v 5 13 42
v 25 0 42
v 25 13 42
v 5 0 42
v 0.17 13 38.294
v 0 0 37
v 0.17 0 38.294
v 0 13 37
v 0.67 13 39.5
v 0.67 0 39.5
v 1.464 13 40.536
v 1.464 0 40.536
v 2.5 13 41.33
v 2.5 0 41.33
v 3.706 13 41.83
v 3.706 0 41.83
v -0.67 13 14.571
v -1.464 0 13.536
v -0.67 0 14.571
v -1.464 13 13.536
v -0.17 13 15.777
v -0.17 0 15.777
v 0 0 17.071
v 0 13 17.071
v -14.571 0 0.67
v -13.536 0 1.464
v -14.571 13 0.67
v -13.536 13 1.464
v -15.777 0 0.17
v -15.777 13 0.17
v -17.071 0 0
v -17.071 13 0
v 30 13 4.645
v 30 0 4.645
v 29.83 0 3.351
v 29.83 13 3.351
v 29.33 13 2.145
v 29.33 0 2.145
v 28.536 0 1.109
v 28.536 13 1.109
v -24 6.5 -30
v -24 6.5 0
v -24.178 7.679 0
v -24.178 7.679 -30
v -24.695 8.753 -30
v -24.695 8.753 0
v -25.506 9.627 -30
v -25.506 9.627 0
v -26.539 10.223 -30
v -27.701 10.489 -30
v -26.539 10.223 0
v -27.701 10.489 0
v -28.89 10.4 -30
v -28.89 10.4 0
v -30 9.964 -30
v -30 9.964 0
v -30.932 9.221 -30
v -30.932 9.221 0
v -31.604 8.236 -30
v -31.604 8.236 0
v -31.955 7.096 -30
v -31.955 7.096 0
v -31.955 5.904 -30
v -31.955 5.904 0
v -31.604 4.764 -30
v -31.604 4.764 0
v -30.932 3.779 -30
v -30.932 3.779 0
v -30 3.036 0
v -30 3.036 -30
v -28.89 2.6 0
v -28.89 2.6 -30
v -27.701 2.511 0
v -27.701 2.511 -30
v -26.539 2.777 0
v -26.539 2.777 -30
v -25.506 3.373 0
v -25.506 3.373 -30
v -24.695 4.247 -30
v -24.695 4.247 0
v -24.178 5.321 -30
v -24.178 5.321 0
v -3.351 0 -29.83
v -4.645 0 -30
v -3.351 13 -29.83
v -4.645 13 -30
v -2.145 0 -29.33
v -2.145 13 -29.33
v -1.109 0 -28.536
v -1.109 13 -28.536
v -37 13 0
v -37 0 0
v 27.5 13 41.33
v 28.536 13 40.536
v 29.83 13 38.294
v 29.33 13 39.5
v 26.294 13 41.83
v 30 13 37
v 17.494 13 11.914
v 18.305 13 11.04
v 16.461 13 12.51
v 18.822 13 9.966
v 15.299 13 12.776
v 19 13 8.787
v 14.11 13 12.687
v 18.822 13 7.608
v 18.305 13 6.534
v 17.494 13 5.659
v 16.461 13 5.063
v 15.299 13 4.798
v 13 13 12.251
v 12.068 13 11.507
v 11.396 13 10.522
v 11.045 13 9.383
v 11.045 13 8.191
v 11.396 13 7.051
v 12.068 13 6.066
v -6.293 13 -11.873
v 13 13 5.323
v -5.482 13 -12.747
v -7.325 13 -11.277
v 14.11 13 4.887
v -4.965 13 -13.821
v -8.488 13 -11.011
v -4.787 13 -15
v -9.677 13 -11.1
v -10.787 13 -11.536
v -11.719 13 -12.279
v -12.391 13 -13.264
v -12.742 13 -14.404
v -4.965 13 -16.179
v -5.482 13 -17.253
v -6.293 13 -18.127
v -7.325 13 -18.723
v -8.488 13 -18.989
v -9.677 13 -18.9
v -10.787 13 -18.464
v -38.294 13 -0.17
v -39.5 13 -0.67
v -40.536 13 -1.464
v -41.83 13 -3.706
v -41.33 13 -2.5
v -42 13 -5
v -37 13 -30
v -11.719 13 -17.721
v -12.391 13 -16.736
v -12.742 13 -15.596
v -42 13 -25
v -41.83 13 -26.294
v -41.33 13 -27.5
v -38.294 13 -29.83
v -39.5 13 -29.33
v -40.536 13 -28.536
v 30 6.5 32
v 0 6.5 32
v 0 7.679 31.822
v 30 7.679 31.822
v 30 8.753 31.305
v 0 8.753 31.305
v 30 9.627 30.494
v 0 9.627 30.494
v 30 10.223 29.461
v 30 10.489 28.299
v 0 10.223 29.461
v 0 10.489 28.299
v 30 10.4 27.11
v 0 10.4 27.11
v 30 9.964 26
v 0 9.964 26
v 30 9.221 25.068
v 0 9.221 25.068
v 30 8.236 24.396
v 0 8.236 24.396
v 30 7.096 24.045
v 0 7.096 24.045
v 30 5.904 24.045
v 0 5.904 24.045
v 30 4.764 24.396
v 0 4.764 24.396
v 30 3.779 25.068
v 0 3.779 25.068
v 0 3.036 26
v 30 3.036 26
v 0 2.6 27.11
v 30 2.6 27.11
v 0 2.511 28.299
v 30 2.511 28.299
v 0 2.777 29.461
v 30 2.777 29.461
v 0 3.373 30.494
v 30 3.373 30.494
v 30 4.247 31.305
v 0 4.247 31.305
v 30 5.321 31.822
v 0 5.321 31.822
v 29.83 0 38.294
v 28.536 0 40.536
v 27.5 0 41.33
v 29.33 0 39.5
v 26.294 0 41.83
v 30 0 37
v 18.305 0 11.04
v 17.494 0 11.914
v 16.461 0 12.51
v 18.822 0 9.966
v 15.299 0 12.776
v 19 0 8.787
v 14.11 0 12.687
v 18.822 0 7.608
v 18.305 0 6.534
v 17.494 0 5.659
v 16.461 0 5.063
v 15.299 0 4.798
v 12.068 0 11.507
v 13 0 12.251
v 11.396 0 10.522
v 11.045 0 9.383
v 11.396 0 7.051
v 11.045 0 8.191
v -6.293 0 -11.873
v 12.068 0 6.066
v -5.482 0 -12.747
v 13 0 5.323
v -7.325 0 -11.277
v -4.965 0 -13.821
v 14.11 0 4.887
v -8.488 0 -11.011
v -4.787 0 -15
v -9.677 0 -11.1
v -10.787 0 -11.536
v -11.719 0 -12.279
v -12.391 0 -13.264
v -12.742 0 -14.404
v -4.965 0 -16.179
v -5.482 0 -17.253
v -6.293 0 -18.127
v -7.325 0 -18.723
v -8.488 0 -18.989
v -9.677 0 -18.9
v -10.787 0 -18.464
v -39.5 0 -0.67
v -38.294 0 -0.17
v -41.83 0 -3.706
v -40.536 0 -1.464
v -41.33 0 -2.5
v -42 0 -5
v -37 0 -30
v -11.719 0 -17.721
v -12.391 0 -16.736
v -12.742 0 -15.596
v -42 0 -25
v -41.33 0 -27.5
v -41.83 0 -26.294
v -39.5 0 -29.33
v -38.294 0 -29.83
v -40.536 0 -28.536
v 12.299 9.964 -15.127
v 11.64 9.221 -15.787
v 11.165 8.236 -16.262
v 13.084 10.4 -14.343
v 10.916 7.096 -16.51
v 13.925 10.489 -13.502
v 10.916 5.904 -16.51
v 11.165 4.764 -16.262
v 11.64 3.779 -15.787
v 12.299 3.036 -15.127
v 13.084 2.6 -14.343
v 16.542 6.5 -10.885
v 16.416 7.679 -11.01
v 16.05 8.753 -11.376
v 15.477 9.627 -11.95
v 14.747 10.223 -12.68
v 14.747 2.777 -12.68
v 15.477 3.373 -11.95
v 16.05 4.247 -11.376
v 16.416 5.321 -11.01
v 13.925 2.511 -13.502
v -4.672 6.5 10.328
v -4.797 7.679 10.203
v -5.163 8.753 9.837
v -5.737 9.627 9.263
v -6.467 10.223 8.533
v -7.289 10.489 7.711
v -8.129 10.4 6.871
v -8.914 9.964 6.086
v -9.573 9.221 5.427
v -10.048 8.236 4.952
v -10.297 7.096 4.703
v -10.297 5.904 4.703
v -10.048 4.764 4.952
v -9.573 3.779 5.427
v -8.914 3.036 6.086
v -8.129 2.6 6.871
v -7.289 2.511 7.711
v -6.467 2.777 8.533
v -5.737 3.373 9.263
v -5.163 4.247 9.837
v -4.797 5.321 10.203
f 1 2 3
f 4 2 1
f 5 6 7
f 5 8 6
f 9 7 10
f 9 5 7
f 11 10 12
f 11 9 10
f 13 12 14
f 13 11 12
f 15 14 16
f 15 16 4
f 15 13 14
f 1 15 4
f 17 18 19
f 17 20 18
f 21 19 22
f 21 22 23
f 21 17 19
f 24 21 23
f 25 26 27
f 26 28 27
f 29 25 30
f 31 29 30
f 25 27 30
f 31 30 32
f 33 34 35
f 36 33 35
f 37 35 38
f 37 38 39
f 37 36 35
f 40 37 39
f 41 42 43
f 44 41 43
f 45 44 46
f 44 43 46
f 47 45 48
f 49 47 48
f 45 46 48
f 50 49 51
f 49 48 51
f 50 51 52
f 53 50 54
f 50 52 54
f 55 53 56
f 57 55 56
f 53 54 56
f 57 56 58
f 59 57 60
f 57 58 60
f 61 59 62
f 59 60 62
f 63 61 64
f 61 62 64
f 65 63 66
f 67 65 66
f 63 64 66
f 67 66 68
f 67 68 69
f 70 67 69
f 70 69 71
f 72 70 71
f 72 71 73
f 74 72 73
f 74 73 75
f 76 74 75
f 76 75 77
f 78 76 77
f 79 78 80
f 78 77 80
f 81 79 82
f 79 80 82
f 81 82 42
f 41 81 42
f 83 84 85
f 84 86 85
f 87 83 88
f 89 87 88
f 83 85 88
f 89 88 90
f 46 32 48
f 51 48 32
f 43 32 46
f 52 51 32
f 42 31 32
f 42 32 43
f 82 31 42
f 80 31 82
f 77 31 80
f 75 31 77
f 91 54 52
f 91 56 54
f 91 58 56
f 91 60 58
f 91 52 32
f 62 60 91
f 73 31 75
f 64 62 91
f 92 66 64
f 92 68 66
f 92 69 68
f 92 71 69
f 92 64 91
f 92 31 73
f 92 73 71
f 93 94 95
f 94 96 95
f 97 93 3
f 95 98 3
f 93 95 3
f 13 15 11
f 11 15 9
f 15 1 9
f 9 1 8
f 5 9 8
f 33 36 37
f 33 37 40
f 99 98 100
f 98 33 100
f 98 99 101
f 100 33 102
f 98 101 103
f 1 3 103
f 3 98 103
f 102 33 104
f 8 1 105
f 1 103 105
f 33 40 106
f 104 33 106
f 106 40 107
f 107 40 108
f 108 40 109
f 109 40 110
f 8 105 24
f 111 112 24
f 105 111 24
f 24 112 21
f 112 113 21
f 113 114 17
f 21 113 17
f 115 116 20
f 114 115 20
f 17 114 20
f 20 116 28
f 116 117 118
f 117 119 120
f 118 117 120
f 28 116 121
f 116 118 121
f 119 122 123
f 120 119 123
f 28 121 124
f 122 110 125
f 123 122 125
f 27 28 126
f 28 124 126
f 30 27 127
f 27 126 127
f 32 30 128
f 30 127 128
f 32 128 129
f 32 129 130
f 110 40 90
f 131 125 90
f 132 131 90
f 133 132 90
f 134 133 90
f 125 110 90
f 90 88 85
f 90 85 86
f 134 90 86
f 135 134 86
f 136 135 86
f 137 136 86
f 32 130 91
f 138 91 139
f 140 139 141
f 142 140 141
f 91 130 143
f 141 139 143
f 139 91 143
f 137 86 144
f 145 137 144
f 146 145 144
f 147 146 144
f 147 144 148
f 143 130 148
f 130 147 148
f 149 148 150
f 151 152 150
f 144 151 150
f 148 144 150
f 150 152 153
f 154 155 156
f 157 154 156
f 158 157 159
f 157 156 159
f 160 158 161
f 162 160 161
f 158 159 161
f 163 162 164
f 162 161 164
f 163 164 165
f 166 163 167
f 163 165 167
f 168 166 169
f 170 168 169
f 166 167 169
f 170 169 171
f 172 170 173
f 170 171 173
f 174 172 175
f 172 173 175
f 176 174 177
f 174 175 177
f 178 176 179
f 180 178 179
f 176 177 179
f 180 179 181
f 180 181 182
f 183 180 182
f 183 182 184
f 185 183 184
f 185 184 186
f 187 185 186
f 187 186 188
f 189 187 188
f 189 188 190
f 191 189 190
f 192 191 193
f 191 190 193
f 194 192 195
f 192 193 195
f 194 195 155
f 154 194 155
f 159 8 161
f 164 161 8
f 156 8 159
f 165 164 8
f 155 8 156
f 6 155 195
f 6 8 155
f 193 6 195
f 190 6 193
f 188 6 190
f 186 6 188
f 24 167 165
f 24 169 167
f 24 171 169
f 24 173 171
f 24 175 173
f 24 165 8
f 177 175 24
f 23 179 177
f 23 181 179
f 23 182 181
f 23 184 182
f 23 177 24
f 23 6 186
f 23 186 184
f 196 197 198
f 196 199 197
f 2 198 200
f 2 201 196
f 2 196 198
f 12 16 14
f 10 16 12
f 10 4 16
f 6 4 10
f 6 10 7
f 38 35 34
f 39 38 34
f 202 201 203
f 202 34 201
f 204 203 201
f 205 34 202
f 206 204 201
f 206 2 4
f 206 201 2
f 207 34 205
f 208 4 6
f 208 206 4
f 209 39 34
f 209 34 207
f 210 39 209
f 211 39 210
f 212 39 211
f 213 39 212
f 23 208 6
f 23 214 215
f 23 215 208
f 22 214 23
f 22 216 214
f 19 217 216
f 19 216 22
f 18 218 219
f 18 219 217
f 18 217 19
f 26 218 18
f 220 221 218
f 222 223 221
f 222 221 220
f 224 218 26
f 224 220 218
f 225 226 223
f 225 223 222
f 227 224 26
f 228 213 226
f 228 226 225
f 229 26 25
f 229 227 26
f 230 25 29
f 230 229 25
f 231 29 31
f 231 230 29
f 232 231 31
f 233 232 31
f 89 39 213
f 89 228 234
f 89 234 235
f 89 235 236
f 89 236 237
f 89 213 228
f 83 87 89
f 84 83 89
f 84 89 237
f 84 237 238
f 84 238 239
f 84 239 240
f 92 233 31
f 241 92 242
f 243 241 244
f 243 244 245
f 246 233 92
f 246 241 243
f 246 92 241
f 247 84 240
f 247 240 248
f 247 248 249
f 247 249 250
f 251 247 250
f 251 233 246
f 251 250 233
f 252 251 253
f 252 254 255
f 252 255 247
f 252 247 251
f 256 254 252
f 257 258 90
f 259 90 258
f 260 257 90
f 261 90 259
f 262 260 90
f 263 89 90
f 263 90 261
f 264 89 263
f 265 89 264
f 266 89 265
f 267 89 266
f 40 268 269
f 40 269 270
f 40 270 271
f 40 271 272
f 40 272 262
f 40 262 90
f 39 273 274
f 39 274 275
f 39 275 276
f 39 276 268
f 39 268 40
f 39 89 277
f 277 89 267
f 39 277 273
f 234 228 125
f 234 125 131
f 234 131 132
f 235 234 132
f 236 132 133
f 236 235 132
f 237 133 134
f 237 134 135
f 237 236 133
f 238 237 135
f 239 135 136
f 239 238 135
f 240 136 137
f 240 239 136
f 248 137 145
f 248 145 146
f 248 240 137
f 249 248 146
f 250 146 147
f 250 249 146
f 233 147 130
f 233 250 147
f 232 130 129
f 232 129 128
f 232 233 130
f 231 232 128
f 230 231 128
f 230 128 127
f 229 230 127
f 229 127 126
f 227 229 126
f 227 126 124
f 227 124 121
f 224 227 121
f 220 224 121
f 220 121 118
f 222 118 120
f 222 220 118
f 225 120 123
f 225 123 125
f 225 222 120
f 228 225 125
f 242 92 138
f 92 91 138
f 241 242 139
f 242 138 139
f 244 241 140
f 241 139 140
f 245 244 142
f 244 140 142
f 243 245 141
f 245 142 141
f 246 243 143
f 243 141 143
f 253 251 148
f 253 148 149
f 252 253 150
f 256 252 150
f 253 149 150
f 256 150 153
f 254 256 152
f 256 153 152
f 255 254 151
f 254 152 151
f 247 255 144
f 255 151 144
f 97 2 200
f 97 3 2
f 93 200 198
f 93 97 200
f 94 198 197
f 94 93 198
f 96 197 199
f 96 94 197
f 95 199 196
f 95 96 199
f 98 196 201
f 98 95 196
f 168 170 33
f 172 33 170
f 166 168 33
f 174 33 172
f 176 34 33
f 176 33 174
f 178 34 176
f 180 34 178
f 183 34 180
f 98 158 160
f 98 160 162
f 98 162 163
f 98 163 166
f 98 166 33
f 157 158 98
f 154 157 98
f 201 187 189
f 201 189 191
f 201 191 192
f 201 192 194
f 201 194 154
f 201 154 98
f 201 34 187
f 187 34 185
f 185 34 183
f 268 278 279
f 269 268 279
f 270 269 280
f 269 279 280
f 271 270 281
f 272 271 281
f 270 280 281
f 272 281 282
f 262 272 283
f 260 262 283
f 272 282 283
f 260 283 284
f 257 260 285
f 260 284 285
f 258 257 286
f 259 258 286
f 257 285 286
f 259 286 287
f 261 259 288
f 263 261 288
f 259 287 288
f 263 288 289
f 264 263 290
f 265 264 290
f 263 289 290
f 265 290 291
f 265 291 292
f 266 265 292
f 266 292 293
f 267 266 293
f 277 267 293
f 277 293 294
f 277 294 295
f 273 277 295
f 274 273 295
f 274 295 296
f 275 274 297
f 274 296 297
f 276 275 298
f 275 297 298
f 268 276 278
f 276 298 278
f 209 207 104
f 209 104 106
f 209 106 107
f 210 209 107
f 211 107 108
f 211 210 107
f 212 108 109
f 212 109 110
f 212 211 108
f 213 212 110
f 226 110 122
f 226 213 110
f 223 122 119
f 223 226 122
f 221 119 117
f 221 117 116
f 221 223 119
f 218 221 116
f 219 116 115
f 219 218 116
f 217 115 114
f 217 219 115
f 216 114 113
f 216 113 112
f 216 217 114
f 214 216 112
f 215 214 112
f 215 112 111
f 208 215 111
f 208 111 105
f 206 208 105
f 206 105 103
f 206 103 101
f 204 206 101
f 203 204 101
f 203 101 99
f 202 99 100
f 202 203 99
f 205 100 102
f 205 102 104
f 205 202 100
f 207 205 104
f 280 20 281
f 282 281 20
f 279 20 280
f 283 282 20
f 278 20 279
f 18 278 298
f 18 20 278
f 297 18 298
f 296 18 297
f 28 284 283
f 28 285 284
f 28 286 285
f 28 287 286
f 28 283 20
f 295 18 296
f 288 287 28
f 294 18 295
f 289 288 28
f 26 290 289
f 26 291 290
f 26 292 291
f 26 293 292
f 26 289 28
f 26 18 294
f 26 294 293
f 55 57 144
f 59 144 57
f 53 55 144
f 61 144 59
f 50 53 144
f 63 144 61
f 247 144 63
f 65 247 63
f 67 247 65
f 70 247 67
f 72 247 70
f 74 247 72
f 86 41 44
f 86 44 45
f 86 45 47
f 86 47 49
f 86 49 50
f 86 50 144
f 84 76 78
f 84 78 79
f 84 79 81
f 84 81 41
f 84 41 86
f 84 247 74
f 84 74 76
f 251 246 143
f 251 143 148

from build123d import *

# Parameters (mm, degrees)
SKETCH1_R      = 4
EXTRUDE1_DEPTH = 13
FILLET5_R      = 5
SKETCH5_R      = 4
EXTRUDE5_DEPTH = 30
SKETCH6_R      = 4
EXTRUDE6_DEPTH = 30
SKETCH8_R      = 4
EXTRUDE7_DEPTH = 30


with BuildPart() as part:
    # Sketch1 → Extrude1 (new body)
    with BuildSketch(Plane(origin=(0, 0, 0), x_dir=(1, 0, 0), z_dir=(0, 1, 0))):
        Polygon((0, -15), (-15, 0), (-42, 0), (-42, 30), (-2.573593129, 30), (30, -2.573593129), (30, -42), (0, -42), align=None)
        with Locations((-8.786796564, 15)):
            Circle(SKETCH1_R, mode=Mode.SUBTRACT)
        with Locations((15, -8.786796564)):
            Circle(SKETCH1_R, mode=Mode.SUBTRACT)
    extrude(amount=EXTRUDE1_DEPTH)

    # Fillet5
    fillet5_edges = [part.edges().sort_by_distance(p)[0] for p in [
        (-42, 6.5, 0),
        (-42, 6.5, -30),
        (-2.573593129, 6.5, -30),
        (30, 6.5, 2.573593129),
        (30, 6.5, 42),
        (0, 6.5, 42),
        (0, 6.5, 15),
        (-15, 6.5, 0),
    ]]
    fillet(fillet5_edges, radius=FILLET5_R)

    # Sketch5 → Extrude5 (cut)
    with BuildSketch(Plane(origin=(-7.5, 0, 7.5), x_dir=(0.707106781, 0, 0.707106781), z_dir=(-0.707106781, 0, 0.707106781))):
        with Locations((0, 6.5)):
            Circle(SKETCH5_R)
    extrude(amount=-EXTRUDE5_DEPTH, mode=Mode.SUBTRACT)

    # Sketch6 → Extrude6 (cut)
    with BuildSketch(Plane.XY):
        with Locations((-28, 6.5)):
            Circle(SKETCH6_R)
    extrude(amount=-EXTRUDE6_DEPTH, mode=Mode.SUBTRACT)

    # Sketch8 → Extrude7 (cut)
    with BuildSketch(Plane.ZY):
        with Locations((28, 6.5)):
            Circle(SKETCH8_R)
    extrude(amount=-EXTRUDE7_DEPTH, mode=Mode.SUBTRACT)


solid = part.part
